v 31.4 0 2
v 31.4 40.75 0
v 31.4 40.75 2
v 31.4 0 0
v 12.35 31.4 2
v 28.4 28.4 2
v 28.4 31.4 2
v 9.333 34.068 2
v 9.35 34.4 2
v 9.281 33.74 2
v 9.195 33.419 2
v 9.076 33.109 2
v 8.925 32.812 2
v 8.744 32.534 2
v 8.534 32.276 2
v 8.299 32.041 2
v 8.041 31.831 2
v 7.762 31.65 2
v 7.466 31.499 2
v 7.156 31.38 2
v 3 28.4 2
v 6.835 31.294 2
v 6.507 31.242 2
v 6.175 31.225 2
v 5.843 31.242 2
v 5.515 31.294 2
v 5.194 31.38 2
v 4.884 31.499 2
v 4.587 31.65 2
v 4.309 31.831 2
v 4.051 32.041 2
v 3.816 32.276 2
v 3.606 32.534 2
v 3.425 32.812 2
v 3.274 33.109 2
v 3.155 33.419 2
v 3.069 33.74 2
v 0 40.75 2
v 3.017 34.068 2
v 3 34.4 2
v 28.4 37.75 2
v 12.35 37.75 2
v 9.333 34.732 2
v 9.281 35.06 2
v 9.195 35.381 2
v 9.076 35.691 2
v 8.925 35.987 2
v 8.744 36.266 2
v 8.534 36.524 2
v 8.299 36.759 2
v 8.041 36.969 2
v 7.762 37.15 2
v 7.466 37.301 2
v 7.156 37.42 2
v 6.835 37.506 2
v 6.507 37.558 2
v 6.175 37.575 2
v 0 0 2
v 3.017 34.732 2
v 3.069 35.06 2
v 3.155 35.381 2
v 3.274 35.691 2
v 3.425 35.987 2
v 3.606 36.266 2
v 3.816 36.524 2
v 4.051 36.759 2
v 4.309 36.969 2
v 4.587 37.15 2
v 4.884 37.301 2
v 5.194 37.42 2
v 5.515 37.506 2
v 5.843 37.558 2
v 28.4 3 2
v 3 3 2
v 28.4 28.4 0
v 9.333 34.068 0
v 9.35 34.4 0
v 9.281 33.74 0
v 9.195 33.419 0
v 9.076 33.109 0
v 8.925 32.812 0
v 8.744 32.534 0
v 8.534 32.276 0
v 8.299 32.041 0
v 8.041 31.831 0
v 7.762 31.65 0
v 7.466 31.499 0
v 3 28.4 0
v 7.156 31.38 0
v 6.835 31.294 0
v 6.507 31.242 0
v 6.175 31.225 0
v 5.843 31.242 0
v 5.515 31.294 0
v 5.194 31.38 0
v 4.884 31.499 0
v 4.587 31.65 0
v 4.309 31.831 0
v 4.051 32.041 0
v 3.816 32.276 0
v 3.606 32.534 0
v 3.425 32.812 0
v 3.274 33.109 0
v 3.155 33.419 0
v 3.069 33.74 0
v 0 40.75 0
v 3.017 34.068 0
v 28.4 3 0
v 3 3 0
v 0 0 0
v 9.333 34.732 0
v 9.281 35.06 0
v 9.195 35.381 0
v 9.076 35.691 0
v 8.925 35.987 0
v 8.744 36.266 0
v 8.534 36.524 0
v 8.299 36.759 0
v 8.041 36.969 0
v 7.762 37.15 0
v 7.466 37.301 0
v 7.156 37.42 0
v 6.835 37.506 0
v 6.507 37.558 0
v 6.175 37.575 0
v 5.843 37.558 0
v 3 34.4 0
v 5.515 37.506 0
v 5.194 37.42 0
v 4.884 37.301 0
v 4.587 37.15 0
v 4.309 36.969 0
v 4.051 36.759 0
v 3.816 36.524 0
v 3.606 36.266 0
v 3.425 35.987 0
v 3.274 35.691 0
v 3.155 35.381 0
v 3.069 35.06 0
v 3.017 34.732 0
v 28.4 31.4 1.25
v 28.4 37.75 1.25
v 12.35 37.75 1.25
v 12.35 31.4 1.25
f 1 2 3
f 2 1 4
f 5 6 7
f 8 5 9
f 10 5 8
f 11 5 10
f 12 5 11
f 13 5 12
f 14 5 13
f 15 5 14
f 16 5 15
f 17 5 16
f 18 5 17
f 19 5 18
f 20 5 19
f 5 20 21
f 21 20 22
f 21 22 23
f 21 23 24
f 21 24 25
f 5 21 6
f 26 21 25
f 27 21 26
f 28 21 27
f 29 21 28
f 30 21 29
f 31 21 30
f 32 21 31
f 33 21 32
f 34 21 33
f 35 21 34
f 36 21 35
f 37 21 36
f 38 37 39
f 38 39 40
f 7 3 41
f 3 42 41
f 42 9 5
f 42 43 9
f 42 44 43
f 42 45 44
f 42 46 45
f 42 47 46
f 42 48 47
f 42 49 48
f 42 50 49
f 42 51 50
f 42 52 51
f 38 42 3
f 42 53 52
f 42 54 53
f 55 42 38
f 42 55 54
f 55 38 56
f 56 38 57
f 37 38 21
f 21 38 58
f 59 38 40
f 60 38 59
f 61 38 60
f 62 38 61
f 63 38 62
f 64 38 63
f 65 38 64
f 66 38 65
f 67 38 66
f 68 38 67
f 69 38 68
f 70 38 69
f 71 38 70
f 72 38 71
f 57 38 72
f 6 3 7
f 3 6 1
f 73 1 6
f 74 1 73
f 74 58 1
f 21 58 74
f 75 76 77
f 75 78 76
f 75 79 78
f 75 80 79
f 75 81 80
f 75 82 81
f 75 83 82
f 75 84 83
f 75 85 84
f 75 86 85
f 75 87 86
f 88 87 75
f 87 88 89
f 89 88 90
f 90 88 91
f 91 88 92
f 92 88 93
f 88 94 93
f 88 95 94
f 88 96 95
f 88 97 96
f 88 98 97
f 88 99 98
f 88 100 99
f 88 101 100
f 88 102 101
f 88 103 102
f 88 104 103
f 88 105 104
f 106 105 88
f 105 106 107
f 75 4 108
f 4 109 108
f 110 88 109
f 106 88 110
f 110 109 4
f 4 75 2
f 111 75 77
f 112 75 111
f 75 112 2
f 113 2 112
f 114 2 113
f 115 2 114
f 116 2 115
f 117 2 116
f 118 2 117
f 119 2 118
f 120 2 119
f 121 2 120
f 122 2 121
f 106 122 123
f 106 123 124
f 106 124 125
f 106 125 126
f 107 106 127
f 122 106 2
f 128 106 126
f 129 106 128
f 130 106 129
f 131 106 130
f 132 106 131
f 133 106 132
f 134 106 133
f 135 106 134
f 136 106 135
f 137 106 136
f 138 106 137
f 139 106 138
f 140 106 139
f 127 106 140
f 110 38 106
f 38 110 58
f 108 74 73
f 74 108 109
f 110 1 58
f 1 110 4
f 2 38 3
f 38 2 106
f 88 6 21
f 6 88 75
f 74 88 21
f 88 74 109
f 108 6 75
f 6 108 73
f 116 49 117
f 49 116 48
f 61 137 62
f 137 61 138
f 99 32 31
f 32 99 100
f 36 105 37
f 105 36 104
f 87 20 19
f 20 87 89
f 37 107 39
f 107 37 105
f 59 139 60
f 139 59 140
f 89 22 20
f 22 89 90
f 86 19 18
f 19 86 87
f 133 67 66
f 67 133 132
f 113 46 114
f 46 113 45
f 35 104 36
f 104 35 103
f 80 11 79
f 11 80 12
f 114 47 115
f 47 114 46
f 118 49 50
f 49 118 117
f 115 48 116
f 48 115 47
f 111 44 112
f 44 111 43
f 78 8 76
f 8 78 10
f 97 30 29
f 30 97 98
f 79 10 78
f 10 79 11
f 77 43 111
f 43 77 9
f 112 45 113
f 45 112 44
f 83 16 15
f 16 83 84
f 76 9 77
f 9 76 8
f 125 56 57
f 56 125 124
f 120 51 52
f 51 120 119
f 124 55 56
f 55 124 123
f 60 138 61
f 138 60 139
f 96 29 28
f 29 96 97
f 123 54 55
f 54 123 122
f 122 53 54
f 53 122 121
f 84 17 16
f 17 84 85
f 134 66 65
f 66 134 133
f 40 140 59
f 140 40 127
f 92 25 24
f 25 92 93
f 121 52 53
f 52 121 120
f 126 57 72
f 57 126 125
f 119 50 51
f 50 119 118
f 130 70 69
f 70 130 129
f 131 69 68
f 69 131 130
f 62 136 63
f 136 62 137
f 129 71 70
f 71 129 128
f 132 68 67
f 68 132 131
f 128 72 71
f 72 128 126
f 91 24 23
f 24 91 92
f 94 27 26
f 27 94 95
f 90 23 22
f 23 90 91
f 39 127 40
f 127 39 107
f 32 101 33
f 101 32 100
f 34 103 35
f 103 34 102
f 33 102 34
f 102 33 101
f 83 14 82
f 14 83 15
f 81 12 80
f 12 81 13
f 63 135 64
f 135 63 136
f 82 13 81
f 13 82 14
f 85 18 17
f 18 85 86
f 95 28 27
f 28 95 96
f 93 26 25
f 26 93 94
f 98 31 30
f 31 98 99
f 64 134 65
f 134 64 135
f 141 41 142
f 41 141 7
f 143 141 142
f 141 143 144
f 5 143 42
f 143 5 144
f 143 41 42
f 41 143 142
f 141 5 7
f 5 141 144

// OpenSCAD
/*
Floss Color Swatch

Avery Label 1/2 in x 5/16 in

DMC Label 1/4 in x 1/4 in = 6.35 mm

Max 1 1/2 in square = 38.1 mm
*/

// Camera

$vpr = [38.5, 0, 45.5];
$vpt = [19.885, 13.2321, 10.0017];
$vpd = 200;

// echo("$vpr", $vpr);
// echo("$vpt", $vpt);
// echo("$vpd", $vpd);

// ECHO: "$vpr", [38.5, 0, 45.5]
// ECHO: "$vpt", [19.885, 13.2321, 10.0017]
// ECHO: "$vpd", 200


// Constants
conv_in_to_mm = 25.4;
conv_mm_to_in = 0.0393701; // NOTE: Just for echo


// Base Settings
frame_height = 2;  // Frame Height
frame_width = 3;  // Frame Width

hole_radius = .125 * conv_in_to_mm; // 1/8 in radius

label_height = 1;
label_width = .25 * conv_in_to_mm; // 1/4 in


// Derived Constants
grid_size = 1 * conv_in_to_mm; // 1 inch grid
frame_length = grid_size + (frame_width * 2); // Frame Length
label_length = frame_length - (hole_radius * 2) - (frame_width * 3); // 1/2 in
top_frame_width = hole_radius * 2 + frame_width * 2;

// echo("frame_length (width inches)", frame_length * conv_mm_to_in);
// echo("frame_length (width inches)", (frame_length + frame_width * 2) * conv_mm_to_in);

union() {
	difference(){
		frame();
		hole();
		label();
	}
}

module frame() {
	color("DarkSlateGray") {
		// Bottom Frame
		cube([frame_length, frame_width, frame_height]);
		
		// Top Frame
		translate([0, frame_length-frame_width, 0])
			cube([frame_length, top_frame_width, frame_height]);
		
		// Left Frame
		rotate(a=90, v=[0, 0, 1])
			translate([0, -frame_width, 0])
				cube([frame_length, frame_width, frame_height]);

		// Right Frame
		rotate(a=90, v=[0, 0, 1])
			translate([0, -frame_length, 0])
				cube([frame_length, frame_width, frame_height]);
	}
}

module hole() {
	height = frame_height * 2;
	h_x = frame_width + hole_radius;
	h_y = frame_length + frame_width;
	color("MediumTurquoise") {
		translate([h_x, h_y, -1])
			cylinder(r=hole_radius, h=height, $fn=60);
	}
}

module label() {
	label_x = frame_length - frame_width - label_length;
	label_y = frame_length;
	color("SlateGray") {
		translate([label_x, label_y, 1.25])
			cube([label_length, label_width, label_height]);
	}
}
